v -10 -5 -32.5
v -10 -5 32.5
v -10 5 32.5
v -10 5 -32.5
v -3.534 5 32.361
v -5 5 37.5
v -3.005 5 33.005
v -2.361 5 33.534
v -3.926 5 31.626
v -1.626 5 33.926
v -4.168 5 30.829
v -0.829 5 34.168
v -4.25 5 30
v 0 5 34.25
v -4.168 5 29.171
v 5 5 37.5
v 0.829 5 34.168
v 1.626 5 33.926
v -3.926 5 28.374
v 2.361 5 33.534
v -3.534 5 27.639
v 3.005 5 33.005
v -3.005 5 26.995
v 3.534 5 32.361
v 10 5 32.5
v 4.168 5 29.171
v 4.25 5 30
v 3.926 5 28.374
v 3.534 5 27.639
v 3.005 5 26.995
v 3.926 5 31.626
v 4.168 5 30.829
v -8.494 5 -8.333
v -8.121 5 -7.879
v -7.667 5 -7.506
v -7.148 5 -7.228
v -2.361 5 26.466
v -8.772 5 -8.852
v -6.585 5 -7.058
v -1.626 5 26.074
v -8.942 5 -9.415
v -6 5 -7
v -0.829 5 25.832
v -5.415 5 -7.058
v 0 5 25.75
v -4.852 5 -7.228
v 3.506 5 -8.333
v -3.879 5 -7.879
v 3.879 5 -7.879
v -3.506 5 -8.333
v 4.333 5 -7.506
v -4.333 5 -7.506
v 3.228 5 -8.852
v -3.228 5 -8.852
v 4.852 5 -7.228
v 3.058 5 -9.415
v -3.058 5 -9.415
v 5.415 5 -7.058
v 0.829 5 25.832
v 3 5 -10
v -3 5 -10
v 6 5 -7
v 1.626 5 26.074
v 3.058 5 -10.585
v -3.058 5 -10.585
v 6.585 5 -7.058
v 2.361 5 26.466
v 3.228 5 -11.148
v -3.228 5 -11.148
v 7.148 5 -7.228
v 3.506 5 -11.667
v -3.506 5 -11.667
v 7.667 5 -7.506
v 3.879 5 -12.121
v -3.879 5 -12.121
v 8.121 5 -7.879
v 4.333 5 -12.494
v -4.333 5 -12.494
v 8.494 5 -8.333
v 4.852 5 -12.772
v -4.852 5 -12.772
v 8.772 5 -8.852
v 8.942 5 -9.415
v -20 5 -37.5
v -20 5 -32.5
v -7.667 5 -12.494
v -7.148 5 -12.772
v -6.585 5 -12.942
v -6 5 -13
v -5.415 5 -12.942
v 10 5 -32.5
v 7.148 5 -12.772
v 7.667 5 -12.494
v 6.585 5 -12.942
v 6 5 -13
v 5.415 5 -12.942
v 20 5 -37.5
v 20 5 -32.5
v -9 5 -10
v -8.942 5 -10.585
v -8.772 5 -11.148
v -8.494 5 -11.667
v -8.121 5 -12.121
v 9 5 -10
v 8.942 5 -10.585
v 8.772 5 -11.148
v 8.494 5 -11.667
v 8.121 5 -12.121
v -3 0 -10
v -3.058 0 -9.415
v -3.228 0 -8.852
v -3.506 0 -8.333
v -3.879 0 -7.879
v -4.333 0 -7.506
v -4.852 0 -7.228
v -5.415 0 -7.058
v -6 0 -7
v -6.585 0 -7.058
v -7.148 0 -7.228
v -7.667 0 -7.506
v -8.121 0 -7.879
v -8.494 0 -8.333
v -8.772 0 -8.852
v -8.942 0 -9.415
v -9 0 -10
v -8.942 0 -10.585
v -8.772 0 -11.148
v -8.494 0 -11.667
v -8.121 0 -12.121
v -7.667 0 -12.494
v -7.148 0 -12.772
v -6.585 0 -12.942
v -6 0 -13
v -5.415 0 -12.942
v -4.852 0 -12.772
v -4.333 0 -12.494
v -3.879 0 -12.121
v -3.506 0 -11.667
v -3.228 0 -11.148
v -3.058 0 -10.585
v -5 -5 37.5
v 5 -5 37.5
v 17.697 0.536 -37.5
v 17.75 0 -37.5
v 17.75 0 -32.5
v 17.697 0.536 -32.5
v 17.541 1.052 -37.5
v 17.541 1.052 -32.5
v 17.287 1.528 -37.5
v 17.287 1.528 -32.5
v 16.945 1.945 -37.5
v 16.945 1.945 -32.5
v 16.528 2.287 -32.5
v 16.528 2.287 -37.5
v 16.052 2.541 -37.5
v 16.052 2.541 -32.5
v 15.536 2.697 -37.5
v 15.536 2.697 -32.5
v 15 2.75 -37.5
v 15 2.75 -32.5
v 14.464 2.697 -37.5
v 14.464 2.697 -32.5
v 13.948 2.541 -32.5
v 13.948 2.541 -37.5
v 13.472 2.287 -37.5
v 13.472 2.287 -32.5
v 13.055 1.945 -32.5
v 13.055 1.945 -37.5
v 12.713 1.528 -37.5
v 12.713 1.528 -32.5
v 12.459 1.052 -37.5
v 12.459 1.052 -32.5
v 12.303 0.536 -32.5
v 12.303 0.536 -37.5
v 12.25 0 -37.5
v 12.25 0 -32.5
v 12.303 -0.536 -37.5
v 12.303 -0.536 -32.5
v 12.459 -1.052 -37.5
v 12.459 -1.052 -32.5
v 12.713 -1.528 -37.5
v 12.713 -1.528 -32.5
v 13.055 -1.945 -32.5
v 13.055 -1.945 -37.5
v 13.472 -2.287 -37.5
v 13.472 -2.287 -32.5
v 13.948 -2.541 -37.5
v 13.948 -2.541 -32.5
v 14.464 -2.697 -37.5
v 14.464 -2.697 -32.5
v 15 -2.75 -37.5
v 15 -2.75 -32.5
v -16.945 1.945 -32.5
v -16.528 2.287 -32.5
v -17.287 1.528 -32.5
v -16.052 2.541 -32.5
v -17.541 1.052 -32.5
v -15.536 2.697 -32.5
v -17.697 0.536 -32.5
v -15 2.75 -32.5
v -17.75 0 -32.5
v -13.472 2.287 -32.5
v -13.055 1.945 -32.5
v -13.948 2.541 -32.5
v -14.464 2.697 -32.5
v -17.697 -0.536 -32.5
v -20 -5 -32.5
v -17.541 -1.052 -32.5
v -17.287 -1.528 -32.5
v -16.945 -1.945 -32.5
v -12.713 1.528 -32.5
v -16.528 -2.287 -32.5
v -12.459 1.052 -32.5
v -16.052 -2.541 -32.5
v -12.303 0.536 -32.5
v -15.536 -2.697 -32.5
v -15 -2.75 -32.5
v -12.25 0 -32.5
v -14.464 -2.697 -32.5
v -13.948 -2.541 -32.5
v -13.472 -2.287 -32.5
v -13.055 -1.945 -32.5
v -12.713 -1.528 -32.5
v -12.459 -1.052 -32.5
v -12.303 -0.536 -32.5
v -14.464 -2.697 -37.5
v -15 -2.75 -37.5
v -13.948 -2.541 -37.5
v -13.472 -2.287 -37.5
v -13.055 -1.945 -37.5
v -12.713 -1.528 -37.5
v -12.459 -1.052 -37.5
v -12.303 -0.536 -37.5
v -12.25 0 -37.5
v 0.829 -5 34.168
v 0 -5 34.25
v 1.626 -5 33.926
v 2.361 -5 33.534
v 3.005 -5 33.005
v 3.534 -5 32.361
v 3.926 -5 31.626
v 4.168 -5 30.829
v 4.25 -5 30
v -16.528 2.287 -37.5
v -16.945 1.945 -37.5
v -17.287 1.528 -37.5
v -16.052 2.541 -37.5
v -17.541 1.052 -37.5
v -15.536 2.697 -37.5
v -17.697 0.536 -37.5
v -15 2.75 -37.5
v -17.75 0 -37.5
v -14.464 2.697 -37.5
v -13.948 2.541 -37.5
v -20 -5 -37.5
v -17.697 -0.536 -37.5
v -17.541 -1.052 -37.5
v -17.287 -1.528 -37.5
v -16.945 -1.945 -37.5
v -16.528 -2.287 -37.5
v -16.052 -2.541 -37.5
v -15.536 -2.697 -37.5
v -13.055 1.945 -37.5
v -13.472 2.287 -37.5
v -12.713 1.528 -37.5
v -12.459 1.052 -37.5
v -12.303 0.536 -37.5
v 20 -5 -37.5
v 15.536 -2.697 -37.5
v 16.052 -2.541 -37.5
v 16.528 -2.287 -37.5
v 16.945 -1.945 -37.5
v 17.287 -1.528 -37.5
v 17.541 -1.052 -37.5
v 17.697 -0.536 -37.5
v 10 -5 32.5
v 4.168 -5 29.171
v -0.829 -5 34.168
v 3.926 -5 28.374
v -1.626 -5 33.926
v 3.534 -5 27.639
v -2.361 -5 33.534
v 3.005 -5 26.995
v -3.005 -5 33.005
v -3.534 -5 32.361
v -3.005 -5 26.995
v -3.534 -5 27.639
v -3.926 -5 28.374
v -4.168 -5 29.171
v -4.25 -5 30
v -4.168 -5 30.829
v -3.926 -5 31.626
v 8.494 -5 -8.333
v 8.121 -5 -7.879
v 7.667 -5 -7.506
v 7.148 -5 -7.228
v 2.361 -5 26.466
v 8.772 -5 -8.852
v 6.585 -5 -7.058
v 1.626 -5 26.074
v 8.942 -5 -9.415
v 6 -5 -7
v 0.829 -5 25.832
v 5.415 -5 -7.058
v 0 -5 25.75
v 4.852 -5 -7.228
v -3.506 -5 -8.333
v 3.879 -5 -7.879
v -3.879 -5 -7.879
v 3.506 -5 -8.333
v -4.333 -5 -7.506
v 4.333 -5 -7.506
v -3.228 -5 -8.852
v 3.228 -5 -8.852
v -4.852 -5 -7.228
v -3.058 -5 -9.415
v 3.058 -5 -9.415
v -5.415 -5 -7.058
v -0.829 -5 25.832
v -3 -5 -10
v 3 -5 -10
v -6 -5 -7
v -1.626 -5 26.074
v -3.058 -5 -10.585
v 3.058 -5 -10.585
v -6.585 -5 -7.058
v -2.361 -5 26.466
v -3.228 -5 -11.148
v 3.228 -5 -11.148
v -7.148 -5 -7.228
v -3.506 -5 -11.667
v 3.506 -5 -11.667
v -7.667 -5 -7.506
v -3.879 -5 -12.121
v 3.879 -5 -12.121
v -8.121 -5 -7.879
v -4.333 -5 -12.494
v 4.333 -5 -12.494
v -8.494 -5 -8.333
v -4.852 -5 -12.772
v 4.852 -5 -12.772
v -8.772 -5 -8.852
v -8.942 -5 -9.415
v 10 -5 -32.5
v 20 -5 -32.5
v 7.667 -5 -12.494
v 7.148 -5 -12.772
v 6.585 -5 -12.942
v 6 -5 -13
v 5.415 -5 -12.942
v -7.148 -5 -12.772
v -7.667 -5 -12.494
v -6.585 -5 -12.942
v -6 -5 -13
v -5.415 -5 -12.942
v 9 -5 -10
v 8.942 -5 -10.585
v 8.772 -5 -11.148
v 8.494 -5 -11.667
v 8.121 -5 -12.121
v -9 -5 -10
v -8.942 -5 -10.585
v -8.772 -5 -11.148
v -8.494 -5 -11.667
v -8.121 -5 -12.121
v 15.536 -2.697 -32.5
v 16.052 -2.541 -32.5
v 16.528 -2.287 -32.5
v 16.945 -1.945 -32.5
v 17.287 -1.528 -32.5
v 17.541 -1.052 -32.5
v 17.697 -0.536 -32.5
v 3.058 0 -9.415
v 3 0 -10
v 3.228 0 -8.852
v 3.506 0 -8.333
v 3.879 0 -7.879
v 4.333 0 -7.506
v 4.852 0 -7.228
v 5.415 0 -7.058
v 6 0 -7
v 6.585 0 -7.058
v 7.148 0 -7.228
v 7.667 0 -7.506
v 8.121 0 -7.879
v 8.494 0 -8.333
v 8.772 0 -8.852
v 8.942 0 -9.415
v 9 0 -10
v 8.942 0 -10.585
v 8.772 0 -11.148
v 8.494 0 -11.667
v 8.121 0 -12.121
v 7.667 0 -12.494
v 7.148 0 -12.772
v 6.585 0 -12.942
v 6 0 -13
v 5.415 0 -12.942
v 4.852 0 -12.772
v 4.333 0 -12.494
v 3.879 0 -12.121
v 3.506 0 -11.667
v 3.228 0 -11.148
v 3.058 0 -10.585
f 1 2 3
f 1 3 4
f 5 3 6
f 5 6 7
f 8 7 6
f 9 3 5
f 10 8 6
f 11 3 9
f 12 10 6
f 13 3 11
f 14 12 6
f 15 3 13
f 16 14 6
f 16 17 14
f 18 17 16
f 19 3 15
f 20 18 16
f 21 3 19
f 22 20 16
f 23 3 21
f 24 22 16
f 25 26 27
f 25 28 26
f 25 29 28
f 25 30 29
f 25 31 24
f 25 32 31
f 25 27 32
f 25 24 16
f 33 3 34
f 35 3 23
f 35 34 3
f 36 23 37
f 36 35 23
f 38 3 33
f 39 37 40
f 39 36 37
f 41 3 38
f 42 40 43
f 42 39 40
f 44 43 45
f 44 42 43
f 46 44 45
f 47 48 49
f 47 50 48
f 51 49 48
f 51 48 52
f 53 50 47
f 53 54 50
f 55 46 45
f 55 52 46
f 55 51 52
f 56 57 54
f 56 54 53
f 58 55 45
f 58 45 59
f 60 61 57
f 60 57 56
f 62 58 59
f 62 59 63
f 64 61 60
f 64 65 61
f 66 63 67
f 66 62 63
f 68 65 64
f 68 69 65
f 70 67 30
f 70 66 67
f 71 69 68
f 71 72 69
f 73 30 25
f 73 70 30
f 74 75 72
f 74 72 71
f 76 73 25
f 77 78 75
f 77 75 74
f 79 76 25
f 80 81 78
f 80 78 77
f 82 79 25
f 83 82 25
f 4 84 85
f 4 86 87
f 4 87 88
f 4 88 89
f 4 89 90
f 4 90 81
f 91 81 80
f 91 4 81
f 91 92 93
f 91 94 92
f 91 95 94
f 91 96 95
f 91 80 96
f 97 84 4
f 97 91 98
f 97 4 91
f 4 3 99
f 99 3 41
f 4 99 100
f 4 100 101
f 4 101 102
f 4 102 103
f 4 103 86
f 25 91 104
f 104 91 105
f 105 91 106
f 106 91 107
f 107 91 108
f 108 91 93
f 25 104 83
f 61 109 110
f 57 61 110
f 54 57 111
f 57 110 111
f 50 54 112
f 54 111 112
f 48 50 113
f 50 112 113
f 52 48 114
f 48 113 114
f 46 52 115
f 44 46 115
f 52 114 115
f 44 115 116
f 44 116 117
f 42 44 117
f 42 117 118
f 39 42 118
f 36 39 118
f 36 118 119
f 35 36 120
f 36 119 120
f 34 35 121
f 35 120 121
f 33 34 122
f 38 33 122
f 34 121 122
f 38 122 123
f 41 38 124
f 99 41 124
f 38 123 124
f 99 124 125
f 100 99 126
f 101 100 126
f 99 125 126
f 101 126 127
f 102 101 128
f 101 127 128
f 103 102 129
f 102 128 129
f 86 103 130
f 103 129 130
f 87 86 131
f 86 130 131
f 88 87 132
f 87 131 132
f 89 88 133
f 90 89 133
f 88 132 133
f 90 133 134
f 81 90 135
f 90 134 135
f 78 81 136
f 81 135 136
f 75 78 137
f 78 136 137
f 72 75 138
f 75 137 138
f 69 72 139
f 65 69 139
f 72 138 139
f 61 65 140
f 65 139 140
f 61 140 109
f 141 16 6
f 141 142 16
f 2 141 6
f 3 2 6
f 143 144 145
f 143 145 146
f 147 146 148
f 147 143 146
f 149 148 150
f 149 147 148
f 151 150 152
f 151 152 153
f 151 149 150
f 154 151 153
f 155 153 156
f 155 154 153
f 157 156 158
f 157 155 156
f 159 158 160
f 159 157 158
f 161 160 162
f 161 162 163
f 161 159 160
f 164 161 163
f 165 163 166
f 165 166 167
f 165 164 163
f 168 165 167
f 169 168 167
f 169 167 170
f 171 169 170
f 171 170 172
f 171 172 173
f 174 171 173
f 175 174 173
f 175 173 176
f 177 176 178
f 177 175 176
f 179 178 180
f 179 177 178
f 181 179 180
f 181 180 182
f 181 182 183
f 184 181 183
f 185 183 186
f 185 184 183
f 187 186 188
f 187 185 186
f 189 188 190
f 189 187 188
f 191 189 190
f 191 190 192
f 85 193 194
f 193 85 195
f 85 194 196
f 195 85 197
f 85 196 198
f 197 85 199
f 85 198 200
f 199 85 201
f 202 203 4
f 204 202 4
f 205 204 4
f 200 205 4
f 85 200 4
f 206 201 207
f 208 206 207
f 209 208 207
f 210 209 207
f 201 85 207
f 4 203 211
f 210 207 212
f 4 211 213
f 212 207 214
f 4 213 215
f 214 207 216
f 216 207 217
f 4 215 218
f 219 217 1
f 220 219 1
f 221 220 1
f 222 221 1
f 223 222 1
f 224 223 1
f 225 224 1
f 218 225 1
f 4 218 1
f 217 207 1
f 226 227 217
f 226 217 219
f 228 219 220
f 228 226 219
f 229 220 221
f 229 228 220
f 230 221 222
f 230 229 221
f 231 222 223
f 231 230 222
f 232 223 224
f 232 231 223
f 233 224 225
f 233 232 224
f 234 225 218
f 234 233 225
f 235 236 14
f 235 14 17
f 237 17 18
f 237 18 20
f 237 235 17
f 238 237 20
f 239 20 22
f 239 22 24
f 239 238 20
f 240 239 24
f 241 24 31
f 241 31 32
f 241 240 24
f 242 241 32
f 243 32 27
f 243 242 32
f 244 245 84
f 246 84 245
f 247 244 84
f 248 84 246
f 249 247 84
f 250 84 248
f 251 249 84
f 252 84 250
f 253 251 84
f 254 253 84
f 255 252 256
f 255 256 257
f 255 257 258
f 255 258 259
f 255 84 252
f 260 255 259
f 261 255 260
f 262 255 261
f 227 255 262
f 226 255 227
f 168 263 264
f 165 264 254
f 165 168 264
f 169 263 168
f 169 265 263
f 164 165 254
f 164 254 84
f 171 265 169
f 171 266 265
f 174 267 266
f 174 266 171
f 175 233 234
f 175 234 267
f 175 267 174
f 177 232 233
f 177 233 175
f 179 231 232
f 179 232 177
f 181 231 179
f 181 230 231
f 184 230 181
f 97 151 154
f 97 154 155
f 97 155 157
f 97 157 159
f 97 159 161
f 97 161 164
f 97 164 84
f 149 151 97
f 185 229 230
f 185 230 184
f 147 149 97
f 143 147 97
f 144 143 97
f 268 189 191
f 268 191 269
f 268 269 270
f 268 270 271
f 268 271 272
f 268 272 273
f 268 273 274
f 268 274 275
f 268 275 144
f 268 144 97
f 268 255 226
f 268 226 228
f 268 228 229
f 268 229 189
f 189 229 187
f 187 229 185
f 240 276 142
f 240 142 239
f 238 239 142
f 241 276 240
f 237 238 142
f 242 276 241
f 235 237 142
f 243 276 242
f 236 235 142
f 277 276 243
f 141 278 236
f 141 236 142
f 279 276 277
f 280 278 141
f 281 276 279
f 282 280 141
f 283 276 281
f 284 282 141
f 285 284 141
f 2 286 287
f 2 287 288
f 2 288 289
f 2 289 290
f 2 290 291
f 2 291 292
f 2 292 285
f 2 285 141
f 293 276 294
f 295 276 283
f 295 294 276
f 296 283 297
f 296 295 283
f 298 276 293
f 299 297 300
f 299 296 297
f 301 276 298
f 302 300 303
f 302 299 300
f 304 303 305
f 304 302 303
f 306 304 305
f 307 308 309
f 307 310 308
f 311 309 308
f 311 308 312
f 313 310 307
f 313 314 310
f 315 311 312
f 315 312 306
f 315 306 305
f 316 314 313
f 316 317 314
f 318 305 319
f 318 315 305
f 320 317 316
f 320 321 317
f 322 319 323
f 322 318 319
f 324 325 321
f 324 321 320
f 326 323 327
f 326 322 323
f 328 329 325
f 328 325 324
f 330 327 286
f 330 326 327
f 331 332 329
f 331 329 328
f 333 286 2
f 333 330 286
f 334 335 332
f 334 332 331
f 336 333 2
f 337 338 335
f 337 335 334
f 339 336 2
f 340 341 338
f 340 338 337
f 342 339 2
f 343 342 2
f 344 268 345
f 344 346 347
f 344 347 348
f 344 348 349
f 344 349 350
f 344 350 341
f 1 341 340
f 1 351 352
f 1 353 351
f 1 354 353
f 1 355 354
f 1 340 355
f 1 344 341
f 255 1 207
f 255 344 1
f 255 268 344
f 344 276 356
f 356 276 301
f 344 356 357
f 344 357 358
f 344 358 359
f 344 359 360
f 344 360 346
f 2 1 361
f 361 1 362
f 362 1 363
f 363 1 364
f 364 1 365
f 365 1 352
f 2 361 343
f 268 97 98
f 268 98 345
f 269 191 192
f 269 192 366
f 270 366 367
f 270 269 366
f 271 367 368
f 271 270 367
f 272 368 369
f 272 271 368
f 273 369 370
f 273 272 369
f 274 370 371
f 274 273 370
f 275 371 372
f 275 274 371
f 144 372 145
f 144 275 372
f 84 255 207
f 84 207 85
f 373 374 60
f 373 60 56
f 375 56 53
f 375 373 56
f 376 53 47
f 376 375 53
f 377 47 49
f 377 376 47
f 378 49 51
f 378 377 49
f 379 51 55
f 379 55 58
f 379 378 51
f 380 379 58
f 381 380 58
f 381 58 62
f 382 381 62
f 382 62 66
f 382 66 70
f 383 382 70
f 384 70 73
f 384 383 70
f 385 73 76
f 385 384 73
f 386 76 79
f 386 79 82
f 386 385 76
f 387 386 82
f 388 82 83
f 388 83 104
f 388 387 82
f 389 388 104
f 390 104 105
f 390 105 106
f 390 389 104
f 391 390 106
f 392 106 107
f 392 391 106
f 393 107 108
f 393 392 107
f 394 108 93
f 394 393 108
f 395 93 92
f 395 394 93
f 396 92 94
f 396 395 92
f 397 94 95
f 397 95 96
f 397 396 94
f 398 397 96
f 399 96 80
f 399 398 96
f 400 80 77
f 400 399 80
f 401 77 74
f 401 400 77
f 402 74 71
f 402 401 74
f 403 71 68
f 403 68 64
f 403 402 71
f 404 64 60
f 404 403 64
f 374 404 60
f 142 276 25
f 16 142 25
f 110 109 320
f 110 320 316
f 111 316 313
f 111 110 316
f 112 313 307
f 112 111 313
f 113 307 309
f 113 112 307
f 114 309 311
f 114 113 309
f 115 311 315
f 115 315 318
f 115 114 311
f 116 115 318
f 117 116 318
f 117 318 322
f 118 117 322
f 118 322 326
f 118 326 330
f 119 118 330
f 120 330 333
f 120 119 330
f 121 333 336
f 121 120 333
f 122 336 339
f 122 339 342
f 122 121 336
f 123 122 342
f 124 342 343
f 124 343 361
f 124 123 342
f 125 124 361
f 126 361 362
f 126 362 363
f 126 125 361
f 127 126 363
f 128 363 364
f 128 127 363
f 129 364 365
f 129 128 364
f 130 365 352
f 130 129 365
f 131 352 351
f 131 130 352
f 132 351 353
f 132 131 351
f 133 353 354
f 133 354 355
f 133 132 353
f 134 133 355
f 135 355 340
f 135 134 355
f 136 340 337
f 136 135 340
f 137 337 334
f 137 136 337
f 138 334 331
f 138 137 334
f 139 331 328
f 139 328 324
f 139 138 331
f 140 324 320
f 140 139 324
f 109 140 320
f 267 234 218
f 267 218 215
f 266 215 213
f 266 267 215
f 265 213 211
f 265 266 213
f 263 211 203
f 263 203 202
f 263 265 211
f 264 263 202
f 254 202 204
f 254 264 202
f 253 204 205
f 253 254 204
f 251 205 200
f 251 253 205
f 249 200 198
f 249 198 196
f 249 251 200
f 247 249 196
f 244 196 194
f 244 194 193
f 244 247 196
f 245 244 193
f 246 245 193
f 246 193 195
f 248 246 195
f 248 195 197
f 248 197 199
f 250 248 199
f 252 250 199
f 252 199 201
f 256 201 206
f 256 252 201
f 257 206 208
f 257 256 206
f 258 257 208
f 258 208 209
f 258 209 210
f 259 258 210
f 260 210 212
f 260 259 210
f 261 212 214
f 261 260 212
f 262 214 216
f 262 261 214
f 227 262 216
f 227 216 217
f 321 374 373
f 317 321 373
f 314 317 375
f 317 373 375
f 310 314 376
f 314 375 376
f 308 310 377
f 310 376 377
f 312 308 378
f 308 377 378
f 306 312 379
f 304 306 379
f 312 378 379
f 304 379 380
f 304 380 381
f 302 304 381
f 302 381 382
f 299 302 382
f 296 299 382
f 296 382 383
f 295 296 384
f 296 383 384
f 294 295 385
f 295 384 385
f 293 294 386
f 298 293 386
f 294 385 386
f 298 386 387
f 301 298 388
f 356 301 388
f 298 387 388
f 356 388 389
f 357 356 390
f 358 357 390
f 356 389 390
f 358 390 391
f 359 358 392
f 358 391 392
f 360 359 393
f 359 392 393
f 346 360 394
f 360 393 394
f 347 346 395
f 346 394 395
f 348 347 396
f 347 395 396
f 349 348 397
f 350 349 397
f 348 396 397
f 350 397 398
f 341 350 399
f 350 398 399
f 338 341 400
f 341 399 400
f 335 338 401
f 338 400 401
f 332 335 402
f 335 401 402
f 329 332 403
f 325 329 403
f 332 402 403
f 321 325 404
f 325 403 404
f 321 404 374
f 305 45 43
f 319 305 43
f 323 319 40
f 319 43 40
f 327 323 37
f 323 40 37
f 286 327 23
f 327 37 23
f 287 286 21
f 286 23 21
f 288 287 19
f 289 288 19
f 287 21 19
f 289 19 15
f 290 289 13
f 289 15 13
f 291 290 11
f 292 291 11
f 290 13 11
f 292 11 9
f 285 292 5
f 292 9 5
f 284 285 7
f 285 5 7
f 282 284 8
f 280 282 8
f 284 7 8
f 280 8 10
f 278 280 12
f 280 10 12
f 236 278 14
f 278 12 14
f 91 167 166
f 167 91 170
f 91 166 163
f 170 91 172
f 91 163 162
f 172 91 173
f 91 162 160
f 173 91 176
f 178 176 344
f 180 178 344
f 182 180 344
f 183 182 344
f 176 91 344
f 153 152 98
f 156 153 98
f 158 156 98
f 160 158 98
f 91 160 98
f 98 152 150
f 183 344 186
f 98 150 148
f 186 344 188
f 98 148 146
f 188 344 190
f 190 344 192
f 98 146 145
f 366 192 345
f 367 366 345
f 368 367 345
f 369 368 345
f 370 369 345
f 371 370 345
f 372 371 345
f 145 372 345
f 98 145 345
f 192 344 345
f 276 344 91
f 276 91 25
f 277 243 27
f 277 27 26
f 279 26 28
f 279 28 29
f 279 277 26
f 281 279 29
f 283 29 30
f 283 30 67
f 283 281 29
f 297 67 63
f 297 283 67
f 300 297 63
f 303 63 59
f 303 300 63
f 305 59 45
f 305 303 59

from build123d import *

# Parameters (mm, degrees)
F0_R     = 3
F1_DEPTH = 5
F2_SIZE  = 5
F4_DEPTH = 5


with BuildPart() as f1:
    # F0 (on Front) → F1 (new body, symmetric)
    with BuildSketch(Plane.XZ):
        Polygon((0, 37.5), (-10, 37.5), (-10, -37.5), (10, -37.5), (10, 37.5), align=None)
        with Locations((-6, -10)):
            Circle(F0_R, mode=Mode.SUBTRACT)
        with BuildLine():
            ThreePointArc((9, -10), (6, -13), (3, -10))
            ThreePointArc((3, -10), (6, -7), (9, -10))
        make_face(mode=Mode.SUBTRACT)
        with BuildLine():
            ThreePointArc((0, 25.75), (-4.25, 30), (0, 34.25))
            ThreePointArc((0, 34.25), (3.005204, 33.005204), (4.25, 30))
            ThreePointArc((4.25, 30), (3.005204, 26.994796), (0, 25.75))
        make_face(mode=Mode.SUBTRACT)
    extrude(amount=F1_DEPTH, both=True)

    # F2
    f2_edges = [f1.edges().sort_by_distance(p)[0] for p in [
        (-10, 0, 37.5),
        (10, 0, 37.5),
    ]]
    chamfer(f2_edges, length=F2_SIZE)

    # F3 (on face) → F4 (join)
    with BuildSketch(Plane(origin=(0, 0, -37.5), x_dir=(1, 0, 0), z_dir=(0, 0, -1))):
        Polygon((-10, -5), (-10, 5), (-15, 5), (-20, 5), (-20, -5), align=None)
        with BuildLine():
            ThreePointArc((-12.25, 0), (-16.944544, -1.944544), (-15, 2.75))
            ThreePointArc((-15, 2.75), (-13.055456, 1.944544), (-12.25, 0))
        make_face(mode=Mode.SUBTRACT)
        Polygon((15, 5), (10, 5), (10, -5), (20, -5), (20, 5), align=None)
        with BuildLine():
            ThreePointArc((17.75, 0), (13.055456, -1.944544), (15, 2.75))
            ThreePointArc((15, 2.75), (16.944544, 1.944544), (17.75, 0))
        make_face(mode=Mode.SUBTRACT)
    extrude(amount=-F4_DEPTH)


solid = f1.part
